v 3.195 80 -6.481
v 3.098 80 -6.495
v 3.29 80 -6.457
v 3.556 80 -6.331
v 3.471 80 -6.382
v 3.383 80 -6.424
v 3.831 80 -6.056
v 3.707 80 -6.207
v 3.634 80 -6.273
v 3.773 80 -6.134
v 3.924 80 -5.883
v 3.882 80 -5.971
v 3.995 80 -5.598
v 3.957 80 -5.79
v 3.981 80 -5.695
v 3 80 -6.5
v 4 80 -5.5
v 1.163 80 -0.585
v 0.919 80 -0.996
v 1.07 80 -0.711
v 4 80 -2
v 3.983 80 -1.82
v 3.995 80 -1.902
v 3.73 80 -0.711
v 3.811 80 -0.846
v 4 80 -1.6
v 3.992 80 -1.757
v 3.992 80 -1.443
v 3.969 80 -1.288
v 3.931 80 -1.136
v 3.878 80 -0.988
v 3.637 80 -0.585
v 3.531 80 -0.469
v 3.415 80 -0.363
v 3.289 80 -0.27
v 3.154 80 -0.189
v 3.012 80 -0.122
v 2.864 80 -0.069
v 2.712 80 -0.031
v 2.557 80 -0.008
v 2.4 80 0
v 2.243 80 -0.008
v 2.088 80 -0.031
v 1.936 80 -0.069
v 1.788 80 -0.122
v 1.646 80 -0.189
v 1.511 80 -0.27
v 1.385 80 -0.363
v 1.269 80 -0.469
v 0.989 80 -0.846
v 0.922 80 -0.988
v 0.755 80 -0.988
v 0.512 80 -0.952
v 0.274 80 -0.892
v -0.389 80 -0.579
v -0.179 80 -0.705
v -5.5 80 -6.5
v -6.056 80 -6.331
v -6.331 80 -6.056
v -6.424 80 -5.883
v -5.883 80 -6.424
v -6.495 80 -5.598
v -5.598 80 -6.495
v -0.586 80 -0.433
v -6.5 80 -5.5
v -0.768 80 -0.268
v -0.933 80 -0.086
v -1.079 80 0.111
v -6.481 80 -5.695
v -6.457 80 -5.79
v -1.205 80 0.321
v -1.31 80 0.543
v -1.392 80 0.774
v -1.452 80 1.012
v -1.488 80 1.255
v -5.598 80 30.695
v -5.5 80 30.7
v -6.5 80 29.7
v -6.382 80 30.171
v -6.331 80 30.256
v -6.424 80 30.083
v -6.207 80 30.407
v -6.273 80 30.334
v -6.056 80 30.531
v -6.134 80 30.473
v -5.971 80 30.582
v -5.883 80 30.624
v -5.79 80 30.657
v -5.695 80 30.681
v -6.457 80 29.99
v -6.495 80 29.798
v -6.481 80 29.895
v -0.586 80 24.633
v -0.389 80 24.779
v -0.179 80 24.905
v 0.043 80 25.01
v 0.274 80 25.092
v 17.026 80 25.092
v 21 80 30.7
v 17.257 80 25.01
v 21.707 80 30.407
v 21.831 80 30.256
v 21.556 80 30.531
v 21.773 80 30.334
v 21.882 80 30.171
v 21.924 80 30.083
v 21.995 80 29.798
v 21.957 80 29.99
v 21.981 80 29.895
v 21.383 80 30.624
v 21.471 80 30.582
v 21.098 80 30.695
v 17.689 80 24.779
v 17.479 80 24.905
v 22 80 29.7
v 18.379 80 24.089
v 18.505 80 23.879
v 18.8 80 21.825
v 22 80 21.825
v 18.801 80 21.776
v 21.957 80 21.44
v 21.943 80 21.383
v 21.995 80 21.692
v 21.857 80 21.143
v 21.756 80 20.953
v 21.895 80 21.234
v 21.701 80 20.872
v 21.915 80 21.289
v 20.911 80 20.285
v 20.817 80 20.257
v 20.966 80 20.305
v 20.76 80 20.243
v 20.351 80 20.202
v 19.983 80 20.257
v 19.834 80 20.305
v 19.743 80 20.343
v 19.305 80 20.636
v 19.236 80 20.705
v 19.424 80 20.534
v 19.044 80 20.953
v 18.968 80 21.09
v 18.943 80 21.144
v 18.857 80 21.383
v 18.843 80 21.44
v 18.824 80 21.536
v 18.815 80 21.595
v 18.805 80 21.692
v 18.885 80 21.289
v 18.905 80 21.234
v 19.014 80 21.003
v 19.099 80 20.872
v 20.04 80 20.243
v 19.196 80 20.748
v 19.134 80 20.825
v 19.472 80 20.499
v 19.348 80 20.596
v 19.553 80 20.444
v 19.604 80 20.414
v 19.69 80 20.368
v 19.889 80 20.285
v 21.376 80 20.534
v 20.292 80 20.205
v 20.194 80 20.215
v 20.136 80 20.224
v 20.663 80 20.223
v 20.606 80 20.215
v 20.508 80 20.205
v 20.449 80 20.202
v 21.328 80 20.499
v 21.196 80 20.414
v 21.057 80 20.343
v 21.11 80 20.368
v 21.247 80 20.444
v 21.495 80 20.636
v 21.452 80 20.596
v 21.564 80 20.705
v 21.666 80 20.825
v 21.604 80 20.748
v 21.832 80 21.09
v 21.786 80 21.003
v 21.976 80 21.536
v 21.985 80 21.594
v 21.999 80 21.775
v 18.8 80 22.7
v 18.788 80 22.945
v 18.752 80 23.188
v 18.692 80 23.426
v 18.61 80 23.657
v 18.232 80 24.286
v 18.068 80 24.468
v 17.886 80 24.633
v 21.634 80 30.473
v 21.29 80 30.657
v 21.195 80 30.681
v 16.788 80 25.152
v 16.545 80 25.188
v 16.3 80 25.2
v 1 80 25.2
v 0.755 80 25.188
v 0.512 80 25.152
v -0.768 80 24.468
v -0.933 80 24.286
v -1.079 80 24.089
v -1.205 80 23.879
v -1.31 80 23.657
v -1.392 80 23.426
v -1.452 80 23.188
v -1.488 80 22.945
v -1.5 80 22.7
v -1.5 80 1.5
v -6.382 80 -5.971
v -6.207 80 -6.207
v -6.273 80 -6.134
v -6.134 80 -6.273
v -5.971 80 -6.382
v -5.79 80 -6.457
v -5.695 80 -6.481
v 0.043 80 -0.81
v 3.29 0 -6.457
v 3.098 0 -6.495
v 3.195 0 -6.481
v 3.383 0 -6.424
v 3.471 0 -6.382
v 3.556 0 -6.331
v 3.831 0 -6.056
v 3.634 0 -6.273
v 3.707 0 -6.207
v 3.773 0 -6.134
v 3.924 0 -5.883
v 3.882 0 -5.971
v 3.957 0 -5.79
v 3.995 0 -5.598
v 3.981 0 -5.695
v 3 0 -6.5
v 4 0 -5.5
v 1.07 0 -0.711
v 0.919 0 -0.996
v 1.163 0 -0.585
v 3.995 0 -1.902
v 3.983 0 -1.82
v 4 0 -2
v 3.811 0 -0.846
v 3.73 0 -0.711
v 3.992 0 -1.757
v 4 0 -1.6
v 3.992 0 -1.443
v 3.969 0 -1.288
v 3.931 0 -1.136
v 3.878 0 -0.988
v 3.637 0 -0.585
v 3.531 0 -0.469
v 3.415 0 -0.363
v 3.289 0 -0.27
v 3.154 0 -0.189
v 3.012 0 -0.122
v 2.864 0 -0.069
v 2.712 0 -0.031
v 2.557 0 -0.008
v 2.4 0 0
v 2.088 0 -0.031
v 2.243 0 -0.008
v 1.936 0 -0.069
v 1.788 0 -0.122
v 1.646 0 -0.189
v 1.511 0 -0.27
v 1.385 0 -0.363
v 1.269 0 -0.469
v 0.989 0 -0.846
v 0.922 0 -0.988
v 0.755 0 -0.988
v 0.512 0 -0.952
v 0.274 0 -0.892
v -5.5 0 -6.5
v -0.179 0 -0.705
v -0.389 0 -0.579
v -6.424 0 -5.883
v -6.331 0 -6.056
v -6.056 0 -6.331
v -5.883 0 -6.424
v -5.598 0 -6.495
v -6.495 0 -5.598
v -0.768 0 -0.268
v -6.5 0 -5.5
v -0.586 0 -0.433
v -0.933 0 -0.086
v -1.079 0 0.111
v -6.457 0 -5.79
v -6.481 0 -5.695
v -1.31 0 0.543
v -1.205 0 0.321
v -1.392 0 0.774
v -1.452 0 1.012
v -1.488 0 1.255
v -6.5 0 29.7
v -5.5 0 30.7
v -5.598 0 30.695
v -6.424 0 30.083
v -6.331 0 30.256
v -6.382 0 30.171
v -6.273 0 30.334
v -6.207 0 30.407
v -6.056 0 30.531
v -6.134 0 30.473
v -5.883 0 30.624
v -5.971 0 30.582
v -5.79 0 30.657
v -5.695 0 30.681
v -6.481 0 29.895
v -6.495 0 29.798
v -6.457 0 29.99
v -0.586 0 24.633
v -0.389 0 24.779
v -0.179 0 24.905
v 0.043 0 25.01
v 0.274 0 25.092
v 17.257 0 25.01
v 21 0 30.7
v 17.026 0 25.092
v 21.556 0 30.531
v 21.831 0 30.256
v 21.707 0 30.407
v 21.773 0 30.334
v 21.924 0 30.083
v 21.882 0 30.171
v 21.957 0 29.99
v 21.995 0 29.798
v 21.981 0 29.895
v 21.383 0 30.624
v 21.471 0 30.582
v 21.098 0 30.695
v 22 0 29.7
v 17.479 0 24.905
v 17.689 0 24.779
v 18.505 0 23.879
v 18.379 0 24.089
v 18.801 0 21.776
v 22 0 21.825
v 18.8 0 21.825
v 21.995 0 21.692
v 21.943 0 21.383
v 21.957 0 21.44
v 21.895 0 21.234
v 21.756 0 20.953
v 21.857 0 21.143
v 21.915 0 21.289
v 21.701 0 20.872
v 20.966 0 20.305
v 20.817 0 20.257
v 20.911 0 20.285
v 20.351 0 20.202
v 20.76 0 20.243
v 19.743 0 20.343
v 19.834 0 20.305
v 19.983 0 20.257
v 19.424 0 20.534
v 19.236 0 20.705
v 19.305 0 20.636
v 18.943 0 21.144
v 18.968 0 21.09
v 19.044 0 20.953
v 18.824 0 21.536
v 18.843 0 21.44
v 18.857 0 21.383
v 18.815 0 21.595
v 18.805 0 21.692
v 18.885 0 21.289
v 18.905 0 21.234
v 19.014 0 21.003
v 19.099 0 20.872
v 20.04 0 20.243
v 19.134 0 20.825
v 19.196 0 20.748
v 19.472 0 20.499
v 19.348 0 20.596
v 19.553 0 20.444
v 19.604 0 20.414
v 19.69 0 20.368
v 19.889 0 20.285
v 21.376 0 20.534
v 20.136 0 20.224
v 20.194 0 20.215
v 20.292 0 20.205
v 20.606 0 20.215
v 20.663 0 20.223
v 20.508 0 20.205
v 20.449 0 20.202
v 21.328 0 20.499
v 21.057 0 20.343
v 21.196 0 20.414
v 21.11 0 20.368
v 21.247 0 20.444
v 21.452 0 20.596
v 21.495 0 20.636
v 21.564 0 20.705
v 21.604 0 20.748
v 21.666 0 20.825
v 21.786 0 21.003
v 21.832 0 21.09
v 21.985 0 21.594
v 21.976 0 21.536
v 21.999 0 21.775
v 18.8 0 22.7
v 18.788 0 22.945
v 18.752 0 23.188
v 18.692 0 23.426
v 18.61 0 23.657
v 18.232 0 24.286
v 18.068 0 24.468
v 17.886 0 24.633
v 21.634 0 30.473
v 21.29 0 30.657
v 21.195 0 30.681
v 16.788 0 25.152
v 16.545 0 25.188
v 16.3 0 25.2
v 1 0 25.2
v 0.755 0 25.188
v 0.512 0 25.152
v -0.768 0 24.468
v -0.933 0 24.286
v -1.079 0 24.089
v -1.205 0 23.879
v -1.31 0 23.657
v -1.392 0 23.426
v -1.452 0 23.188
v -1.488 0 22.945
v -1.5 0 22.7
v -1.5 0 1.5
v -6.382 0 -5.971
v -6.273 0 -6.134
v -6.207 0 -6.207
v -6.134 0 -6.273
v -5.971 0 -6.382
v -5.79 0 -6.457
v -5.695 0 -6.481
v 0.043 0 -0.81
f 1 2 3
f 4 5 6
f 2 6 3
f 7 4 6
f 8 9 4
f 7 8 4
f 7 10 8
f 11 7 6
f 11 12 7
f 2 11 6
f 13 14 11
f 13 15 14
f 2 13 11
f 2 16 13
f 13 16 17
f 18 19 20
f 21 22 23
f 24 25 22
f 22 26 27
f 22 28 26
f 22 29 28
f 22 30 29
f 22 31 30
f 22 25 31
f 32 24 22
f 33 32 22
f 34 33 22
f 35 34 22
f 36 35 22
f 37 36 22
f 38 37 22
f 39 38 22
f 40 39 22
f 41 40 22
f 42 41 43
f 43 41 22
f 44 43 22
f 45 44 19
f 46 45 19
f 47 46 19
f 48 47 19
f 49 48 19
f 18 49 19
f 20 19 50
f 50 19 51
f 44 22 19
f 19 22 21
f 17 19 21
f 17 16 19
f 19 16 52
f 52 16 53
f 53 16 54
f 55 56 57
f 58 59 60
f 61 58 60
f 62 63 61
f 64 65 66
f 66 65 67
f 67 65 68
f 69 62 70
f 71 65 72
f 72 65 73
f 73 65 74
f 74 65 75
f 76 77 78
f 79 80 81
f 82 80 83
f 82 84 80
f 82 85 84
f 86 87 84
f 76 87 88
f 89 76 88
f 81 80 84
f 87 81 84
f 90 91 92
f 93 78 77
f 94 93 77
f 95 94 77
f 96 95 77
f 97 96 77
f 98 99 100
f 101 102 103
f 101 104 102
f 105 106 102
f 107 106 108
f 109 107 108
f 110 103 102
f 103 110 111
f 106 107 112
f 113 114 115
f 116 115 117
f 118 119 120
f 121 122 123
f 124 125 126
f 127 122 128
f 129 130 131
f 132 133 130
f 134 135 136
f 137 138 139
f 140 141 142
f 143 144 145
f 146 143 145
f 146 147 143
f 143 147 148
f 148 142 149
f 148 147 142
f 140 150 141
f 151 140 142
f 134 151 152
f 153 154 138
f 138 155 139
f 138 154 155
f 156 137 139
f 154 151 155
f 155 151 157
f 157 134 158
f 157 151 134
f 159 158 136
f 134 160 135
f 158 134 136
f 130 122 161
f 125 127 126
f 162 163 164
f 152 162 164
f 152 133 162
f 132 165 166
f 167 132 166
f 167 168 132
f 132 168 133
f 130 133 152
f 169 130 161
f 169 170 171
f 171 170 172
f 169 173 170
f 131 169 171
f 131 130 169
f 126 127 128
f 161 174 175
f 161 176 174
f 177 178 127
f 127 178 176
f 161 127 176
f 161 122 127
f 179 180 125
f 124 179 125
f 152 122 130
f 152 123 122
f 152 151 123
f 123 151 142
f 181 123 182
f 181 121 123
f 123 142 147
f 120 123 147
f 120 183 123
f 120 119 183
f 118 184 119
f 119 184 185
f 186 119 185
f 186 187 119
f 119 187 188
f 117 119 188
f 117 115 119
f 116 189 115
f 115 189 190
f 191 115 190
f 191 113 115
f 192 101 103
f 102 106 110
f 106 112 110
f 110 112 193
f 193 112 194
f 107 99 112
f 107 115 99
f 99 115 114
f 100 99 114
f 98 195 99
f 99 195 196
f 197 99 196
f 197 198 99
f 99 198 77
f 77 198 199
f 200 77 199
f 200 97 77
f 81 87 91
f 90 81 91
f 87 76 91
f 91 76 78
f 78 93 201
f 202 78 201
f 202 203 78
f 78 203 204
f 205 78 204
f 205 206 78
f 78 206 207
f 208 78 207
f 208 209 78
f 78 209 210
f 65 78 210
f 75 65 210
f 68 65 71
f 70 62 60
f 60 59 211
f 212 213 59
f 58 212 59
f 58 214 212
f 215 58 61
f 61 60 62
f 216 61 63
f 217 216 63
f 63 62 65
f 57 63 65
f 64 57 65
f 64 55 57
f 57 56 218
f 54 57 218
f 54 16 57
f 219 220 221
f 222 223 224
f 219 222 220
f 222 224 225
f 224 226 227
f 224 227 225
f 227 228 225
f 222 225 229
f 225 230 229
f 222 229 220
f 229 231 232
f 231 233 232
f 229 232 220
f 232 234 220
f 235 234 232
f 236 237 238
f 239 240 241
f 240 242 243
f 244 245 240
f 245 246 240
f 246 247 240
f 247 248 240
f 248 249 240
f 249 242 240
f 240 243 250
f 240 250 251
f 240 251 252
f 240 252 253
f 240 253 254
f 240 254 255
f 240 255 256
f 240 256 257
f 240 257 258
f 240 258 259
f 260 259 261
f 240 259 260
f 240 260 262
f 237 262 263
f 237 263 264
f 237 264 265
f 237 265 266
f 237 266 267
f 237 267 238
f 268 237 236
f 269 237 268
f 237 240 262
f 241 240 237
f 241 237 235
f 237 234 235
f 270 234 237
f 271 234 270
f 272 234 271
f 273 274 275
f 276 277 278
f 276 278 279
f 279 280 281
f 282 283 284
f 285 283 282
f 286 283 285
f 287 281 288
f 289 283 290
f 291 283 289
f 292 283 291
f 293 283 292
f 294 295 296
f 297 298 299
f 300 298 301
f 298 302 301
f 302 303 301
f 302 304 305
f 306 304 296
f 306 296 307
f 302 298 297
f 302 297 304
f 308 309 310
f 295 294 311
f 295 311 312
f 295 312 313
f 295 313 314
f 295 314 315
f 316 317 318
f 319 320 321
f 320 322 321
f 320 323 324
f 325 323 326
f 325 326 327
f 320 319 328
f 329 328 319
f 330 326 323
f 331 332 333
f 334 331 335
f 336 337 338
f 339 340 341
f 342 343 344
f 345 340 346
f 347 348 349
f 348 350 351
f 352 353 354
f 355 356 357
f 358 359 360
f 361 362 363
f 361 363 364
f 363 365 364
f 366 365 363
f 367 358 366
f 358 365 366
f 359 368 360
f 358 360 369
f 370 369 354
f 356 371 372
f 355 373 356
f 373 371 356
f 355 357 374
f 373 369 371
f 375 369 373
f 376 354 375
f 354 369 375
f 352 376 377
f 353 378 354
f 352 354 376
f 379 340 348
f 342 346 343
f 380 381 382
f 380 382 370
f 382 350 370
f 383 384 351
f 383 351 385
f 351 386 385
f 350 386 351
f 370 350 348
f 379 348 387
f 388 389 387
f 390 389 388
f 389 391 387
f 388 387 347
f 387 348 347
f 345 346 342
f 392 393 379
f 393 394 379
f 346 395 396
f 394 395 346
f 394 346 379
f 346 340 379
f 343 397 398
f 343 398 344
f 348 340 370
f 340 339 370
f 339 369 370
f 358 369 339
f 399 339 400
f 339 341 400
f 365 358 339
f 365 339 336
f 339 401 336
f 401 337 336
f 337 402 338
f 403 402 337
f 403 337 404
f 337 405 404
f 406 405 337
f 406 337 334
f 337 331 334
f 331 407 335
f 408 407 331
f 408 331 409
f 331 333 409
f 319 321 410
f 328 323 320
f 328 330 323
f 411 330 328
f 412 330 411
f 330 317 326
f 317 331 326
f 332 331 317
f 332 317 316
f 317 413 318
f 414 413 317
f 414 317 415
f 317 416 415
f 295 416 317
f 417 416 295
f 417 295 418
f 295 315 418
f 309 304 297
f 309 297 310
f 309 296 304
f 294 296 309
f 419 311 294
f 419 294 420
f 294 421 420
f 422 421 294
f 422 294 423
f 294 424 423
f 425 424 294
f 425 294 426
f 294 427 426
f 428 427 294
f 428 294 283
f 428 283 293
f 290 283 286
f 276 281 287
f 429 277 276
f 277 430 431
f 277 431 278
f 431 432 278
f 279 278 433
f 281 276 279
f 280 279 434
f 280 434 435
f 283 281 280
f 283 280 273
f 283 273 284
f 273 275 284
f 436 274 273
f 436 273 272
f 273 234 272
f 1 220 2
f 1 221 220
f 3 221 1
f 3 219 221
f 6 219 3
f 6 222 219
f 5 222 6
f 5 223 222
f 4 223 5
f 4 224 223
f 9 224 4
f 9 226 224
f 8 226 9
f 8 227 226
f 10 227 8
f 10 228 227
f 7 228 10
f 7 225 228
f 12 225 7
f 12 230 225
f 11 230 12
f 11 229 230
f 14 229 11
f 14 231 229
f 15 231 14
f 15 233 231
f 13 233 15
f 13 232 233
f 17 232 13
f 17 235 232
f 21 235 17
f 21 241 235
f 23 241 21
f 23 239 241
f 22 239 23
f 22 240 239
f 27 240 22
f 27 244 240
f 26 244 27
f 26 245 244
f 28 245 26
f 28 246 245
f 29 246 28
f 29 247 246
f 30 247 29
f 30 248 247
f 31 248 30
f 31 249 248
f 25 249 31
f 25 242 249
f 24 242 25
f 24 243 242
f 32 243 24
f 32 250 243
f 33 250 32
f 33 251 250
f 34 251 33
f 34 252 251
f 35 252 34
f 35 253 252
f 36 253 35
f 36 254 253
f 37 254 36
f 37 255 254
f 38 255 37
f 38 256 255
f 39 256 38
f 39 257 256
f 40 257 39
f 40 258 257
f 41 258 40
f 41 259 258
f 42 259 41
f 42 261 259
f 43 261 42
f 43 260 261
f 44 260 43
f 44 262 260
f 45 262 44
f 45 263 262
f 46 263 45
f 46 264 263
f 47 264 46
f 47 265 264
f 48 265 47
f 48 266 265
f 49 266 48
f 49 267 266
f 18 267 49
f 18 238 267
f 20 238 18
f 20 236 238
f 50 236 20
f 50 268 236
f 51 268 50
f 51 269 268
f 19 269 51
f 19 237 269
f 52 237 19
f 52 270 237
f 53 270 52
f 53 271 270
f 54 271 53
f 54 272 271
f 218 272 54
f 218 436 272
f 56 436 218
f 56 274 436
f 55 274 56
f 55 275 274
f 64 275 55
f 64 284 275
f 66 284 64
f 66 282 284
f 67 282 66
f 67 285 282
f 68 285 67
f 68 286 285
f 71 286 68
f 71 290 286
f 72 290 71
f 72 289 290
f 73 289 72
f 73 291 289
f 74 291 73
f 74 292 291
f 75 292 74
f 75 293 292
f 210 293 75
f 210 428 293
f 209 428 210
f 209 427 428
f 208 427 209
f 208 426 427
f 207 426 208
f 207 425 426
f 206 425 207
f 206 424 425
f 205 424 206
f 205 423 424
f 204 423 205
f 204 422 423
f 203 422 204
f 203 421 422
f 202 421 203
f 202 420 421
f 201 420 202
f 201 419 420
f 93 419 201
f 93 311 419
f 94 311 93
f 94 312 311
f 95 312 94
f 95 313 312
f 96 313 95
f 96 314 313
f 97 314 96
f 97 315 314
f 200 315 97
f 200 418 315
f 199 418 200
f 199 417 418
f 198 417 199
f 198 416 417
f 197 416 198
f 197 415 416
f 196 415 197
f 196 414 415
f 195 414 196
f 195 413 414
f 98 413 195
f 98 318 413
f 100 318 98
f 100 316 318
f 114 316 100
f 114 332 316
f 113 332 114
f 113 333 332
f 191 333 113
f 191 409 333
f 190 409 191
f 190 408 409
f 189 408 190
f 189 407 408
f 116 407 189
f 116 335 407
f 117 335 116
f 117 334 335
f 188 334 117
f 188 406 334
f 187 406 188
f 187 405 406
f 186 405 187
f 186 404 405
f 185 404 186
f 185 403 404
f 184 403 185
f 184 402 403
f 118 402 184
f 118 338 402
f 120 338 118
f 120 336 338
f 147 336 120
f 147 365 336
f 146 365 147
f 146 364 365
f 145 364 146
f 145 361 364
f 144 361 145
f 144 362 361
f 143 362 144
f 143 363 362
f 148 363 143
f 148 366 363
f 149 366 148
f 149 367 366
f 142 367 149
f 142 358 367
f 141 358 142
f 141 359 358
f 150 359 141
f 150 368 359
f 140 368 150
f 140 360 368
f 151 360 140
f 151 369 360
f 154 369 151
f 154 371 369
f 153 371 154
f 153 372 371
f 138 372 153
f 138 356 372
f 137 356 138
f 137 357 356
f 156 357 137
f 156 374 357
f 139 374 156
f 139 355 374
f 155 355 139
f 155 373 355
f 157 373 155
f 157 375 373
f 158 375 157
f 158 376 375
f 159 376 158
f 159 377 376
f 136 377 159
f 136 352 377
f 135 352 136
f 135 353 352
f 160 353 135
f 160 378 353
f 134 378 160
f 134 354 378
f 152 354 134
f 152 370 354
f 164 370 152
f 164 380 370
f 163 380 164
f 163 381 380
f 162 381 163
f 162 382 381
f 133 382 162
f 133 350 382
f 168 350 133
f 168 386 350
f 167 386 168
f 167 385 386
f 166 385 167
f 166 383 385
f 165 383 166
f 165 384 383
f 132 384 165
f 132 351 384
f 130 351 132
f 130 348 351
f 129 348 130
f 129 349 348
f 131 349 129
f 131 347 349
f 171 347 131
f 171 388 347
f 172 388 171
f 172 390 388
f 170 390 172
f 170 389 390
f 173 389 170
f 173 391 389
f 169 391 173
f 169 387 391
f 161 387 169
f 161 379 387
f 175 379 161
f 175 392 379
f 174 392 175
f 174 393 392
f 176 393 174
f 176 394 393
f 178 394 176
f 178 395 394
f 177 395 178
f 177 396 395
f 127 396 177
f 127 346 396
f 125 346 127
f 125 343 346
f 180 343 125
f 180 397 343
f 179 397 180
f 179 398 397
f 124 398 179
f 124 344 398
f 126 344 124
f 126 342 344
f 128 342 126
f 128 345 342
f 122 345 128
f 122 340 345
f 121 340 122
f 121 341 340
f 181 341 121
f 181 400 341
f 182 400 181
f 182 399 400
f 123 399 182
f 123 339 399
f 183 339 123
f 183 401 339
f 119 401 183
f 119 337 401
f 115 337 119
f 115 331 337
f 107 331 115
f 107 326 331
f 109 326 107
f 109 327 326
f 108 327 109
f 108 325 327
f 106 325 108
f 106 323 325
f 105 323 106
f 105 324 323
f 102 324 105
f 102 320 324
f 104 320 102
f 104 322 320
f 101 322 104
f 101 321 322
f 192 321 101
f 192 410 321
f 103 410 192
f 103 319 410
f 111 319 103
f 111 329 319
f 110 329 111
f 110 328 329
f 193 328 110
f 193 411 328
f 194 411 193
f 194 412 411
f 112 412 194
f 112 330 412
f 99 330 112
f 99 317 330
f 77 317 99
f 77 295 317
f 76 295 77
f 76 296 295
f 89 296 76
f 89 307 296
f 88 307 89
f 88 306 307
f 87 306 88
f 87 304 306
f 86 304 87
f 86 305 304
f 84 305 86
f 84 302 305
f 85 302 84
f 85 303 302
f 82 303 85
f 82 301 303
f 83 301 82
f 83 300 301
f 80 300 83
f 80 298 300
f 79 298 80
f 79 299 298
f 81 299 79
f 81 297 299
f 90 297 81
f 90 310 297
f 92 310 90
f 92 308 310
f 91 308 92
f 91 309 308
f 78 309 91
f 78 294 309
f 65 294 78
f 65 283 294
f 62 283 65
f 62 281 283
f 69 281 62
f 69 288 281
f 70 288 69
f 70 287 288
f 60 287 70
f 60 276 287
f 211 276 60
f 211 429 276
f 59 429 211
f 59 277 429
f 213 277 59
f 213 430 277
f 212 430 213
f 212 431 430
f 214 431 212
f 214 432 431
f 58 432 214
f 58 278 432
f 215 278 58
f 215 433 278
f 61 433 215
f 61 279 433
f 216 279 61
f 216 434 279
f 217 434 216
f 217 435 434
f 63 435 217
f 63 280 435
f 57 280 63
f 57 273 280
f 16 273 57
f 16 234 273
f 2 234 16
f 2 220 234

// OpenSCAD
// Snap clip for a filament dry box (no screws, one printed part)
//
// The clip is a C-spring. The gap between the two contact ridges is a little
// smaller than the lid + rim stack. You push the clip on from the side. The
// C-frame opens a little and then presses the lid down on the box.
//
// Measure the stack: lid top to the underside of the box rim (the same
// position as the caliper jaws). Put this value in `stack`.
//
// Coordinates (use position):
//   x = into the box. x = 0 is the outermost point of lid / rim.
//   y = along the box edge (clip width)
//   z = up. z = 0 is the underside of the box rim.

/* [Part] */
part = "assembly"; // [assembly:Assembly preview, clip:Clip (print orientation), test_set:Test set - 3 clips with different preload]

/* [Box measurements] */
// Underside of the box rim to the lid surface where the upper tooth presses (mm)
stack = 21;
// Distance the upper tooth reaches in over the lid, measured from x = 0 (mm)
top_reach = 22;
// Distance the bottom ridge reaches in under the rim, measured from x = 0 (mm)
bottom_reach = 4;

/* [Fit] */
// Interference: the ridge gap is this much smaller than the stack (mm). More = tighter.
preload = 0.8;
// Height of the bottom contact ridge (mm)
ridge_h = 1.0;
// Depth of the upper tooth: how far it hangs down below the top jaw (mm)
top_tooth_depth = 5;
// Width of the upper tooth (mm). The tip is a half circle of this width.
top_tooth_w = 3.2;
// Air between the spine and the outermost point of lid / rim (mm)
spine_clear = 1.5;

/* [Frame] */
// Clip width along the box edge (mm)
width = 80;
// Spine thickness (mm). Thinner = softer spring.
spine_t = 5.0;
// Jaw thickness (mm)
jaw_t = 5.5;
// Inner fillet radius (mm). It also gives space for a round lid edge.
fillet_r = 2.5;
// Outer edge radius (mm)
edge_r = 1;

/* [Hidden] */
$fn = 64;
ridge_r = 1.6;

// ---------------------------------------------------------------------------

if (part == "assembly")
  assembly();
else if (part == "clip")
  print_pose() clip(preload);
else if (part == "test_set")
  for (i = [0:2])
    translate([i * (top_reach + spine_clear + spine_t + 8), 0, 0])
      print_pose() clip([0.4, 0.8, 1.2][i], 8);

// ---------------------------------------------------------------------------

function contact_gap(p) = stack - p;

echo(str("CLIP: stack ", stack, " mm, ridge gap ", contact_gap(preload), " mm, preload ", preload, " mm"));

// Ridge: round bump along y, protrudes `ridge_h` out of the jaw face.
// `up` = 1 for the bottom jaw (bump points up), -1 for the top jaw.
module ridge2d(x, face_z, up) {
  translate([x - ridge_r, face_z + up * (ridge_h - ridge_r)]) circle(r=ridge_r);
}

// Upper tooth: a finger with a round tip. Outer edge flush with the jaw tip.
module tooth2d(x, tip_z, top_z, w) {
  hull() {
    translate([x - w / 2, tip_z + w / 2]) circle(d=w);
    translate([x - w, top_z - 0.01]) square([w, 0.5]); // root, inside the jaw
  }
}

module profile2d(p) {
  xs = -spine_clear - spine_t; // outer face of the spine
  // bottom jaw: top face at z = -ridge_h, so the ridge top is at z = 0
  bz = -ridge_h;
  // top jaw: underside at z = tz, so the upper tooth tip is at contact_gap
  tz = contact_gap(p) + top_tooth_depth;

  offset(r=edge_r) offset(delta=-edge_r)
      offset(r=-fillet_r) offset(delta=fillet_r)
          union() {
            translate([xs, bz - jaw_t]) square([spine_t, tz - bz + 2 * jaw_t]); // spine
            translate([xs, bz - jaw_t]) square([bottom_reach - xs, jaw_t]); // bottom jaw
            translate([xs, tz]) square([top_reach - xs, jaw_t]); // top jaw
            tooth2d(top_reach, contact_gap(p), tz, top_tooth_w); // upper tooth
          }
  ridge2d(bottom_reach, bz, 1);
}

module clip(p, w = width) {
  translate([0, w, 0]) rotate([90, 0, 0]) linear_extrude(w) profile2d(p);
}

// Lay the clip on its side: the C-profile is flat on the bed.
// Layers then follow the spring, which is the strongest direction.
module print_pose() {
  rotate([90, 0, 0]) children();
}

module assembly() {
  color("orange") clip(preload);
  // ghost of lid and box rim (simplified)
  %translate([0, -20, 0]) cube([60, width + 40, stack]);
  %translate([bottom_reach + 0.5, -20, -40]) cube([2, width + 40, 40]);
}
